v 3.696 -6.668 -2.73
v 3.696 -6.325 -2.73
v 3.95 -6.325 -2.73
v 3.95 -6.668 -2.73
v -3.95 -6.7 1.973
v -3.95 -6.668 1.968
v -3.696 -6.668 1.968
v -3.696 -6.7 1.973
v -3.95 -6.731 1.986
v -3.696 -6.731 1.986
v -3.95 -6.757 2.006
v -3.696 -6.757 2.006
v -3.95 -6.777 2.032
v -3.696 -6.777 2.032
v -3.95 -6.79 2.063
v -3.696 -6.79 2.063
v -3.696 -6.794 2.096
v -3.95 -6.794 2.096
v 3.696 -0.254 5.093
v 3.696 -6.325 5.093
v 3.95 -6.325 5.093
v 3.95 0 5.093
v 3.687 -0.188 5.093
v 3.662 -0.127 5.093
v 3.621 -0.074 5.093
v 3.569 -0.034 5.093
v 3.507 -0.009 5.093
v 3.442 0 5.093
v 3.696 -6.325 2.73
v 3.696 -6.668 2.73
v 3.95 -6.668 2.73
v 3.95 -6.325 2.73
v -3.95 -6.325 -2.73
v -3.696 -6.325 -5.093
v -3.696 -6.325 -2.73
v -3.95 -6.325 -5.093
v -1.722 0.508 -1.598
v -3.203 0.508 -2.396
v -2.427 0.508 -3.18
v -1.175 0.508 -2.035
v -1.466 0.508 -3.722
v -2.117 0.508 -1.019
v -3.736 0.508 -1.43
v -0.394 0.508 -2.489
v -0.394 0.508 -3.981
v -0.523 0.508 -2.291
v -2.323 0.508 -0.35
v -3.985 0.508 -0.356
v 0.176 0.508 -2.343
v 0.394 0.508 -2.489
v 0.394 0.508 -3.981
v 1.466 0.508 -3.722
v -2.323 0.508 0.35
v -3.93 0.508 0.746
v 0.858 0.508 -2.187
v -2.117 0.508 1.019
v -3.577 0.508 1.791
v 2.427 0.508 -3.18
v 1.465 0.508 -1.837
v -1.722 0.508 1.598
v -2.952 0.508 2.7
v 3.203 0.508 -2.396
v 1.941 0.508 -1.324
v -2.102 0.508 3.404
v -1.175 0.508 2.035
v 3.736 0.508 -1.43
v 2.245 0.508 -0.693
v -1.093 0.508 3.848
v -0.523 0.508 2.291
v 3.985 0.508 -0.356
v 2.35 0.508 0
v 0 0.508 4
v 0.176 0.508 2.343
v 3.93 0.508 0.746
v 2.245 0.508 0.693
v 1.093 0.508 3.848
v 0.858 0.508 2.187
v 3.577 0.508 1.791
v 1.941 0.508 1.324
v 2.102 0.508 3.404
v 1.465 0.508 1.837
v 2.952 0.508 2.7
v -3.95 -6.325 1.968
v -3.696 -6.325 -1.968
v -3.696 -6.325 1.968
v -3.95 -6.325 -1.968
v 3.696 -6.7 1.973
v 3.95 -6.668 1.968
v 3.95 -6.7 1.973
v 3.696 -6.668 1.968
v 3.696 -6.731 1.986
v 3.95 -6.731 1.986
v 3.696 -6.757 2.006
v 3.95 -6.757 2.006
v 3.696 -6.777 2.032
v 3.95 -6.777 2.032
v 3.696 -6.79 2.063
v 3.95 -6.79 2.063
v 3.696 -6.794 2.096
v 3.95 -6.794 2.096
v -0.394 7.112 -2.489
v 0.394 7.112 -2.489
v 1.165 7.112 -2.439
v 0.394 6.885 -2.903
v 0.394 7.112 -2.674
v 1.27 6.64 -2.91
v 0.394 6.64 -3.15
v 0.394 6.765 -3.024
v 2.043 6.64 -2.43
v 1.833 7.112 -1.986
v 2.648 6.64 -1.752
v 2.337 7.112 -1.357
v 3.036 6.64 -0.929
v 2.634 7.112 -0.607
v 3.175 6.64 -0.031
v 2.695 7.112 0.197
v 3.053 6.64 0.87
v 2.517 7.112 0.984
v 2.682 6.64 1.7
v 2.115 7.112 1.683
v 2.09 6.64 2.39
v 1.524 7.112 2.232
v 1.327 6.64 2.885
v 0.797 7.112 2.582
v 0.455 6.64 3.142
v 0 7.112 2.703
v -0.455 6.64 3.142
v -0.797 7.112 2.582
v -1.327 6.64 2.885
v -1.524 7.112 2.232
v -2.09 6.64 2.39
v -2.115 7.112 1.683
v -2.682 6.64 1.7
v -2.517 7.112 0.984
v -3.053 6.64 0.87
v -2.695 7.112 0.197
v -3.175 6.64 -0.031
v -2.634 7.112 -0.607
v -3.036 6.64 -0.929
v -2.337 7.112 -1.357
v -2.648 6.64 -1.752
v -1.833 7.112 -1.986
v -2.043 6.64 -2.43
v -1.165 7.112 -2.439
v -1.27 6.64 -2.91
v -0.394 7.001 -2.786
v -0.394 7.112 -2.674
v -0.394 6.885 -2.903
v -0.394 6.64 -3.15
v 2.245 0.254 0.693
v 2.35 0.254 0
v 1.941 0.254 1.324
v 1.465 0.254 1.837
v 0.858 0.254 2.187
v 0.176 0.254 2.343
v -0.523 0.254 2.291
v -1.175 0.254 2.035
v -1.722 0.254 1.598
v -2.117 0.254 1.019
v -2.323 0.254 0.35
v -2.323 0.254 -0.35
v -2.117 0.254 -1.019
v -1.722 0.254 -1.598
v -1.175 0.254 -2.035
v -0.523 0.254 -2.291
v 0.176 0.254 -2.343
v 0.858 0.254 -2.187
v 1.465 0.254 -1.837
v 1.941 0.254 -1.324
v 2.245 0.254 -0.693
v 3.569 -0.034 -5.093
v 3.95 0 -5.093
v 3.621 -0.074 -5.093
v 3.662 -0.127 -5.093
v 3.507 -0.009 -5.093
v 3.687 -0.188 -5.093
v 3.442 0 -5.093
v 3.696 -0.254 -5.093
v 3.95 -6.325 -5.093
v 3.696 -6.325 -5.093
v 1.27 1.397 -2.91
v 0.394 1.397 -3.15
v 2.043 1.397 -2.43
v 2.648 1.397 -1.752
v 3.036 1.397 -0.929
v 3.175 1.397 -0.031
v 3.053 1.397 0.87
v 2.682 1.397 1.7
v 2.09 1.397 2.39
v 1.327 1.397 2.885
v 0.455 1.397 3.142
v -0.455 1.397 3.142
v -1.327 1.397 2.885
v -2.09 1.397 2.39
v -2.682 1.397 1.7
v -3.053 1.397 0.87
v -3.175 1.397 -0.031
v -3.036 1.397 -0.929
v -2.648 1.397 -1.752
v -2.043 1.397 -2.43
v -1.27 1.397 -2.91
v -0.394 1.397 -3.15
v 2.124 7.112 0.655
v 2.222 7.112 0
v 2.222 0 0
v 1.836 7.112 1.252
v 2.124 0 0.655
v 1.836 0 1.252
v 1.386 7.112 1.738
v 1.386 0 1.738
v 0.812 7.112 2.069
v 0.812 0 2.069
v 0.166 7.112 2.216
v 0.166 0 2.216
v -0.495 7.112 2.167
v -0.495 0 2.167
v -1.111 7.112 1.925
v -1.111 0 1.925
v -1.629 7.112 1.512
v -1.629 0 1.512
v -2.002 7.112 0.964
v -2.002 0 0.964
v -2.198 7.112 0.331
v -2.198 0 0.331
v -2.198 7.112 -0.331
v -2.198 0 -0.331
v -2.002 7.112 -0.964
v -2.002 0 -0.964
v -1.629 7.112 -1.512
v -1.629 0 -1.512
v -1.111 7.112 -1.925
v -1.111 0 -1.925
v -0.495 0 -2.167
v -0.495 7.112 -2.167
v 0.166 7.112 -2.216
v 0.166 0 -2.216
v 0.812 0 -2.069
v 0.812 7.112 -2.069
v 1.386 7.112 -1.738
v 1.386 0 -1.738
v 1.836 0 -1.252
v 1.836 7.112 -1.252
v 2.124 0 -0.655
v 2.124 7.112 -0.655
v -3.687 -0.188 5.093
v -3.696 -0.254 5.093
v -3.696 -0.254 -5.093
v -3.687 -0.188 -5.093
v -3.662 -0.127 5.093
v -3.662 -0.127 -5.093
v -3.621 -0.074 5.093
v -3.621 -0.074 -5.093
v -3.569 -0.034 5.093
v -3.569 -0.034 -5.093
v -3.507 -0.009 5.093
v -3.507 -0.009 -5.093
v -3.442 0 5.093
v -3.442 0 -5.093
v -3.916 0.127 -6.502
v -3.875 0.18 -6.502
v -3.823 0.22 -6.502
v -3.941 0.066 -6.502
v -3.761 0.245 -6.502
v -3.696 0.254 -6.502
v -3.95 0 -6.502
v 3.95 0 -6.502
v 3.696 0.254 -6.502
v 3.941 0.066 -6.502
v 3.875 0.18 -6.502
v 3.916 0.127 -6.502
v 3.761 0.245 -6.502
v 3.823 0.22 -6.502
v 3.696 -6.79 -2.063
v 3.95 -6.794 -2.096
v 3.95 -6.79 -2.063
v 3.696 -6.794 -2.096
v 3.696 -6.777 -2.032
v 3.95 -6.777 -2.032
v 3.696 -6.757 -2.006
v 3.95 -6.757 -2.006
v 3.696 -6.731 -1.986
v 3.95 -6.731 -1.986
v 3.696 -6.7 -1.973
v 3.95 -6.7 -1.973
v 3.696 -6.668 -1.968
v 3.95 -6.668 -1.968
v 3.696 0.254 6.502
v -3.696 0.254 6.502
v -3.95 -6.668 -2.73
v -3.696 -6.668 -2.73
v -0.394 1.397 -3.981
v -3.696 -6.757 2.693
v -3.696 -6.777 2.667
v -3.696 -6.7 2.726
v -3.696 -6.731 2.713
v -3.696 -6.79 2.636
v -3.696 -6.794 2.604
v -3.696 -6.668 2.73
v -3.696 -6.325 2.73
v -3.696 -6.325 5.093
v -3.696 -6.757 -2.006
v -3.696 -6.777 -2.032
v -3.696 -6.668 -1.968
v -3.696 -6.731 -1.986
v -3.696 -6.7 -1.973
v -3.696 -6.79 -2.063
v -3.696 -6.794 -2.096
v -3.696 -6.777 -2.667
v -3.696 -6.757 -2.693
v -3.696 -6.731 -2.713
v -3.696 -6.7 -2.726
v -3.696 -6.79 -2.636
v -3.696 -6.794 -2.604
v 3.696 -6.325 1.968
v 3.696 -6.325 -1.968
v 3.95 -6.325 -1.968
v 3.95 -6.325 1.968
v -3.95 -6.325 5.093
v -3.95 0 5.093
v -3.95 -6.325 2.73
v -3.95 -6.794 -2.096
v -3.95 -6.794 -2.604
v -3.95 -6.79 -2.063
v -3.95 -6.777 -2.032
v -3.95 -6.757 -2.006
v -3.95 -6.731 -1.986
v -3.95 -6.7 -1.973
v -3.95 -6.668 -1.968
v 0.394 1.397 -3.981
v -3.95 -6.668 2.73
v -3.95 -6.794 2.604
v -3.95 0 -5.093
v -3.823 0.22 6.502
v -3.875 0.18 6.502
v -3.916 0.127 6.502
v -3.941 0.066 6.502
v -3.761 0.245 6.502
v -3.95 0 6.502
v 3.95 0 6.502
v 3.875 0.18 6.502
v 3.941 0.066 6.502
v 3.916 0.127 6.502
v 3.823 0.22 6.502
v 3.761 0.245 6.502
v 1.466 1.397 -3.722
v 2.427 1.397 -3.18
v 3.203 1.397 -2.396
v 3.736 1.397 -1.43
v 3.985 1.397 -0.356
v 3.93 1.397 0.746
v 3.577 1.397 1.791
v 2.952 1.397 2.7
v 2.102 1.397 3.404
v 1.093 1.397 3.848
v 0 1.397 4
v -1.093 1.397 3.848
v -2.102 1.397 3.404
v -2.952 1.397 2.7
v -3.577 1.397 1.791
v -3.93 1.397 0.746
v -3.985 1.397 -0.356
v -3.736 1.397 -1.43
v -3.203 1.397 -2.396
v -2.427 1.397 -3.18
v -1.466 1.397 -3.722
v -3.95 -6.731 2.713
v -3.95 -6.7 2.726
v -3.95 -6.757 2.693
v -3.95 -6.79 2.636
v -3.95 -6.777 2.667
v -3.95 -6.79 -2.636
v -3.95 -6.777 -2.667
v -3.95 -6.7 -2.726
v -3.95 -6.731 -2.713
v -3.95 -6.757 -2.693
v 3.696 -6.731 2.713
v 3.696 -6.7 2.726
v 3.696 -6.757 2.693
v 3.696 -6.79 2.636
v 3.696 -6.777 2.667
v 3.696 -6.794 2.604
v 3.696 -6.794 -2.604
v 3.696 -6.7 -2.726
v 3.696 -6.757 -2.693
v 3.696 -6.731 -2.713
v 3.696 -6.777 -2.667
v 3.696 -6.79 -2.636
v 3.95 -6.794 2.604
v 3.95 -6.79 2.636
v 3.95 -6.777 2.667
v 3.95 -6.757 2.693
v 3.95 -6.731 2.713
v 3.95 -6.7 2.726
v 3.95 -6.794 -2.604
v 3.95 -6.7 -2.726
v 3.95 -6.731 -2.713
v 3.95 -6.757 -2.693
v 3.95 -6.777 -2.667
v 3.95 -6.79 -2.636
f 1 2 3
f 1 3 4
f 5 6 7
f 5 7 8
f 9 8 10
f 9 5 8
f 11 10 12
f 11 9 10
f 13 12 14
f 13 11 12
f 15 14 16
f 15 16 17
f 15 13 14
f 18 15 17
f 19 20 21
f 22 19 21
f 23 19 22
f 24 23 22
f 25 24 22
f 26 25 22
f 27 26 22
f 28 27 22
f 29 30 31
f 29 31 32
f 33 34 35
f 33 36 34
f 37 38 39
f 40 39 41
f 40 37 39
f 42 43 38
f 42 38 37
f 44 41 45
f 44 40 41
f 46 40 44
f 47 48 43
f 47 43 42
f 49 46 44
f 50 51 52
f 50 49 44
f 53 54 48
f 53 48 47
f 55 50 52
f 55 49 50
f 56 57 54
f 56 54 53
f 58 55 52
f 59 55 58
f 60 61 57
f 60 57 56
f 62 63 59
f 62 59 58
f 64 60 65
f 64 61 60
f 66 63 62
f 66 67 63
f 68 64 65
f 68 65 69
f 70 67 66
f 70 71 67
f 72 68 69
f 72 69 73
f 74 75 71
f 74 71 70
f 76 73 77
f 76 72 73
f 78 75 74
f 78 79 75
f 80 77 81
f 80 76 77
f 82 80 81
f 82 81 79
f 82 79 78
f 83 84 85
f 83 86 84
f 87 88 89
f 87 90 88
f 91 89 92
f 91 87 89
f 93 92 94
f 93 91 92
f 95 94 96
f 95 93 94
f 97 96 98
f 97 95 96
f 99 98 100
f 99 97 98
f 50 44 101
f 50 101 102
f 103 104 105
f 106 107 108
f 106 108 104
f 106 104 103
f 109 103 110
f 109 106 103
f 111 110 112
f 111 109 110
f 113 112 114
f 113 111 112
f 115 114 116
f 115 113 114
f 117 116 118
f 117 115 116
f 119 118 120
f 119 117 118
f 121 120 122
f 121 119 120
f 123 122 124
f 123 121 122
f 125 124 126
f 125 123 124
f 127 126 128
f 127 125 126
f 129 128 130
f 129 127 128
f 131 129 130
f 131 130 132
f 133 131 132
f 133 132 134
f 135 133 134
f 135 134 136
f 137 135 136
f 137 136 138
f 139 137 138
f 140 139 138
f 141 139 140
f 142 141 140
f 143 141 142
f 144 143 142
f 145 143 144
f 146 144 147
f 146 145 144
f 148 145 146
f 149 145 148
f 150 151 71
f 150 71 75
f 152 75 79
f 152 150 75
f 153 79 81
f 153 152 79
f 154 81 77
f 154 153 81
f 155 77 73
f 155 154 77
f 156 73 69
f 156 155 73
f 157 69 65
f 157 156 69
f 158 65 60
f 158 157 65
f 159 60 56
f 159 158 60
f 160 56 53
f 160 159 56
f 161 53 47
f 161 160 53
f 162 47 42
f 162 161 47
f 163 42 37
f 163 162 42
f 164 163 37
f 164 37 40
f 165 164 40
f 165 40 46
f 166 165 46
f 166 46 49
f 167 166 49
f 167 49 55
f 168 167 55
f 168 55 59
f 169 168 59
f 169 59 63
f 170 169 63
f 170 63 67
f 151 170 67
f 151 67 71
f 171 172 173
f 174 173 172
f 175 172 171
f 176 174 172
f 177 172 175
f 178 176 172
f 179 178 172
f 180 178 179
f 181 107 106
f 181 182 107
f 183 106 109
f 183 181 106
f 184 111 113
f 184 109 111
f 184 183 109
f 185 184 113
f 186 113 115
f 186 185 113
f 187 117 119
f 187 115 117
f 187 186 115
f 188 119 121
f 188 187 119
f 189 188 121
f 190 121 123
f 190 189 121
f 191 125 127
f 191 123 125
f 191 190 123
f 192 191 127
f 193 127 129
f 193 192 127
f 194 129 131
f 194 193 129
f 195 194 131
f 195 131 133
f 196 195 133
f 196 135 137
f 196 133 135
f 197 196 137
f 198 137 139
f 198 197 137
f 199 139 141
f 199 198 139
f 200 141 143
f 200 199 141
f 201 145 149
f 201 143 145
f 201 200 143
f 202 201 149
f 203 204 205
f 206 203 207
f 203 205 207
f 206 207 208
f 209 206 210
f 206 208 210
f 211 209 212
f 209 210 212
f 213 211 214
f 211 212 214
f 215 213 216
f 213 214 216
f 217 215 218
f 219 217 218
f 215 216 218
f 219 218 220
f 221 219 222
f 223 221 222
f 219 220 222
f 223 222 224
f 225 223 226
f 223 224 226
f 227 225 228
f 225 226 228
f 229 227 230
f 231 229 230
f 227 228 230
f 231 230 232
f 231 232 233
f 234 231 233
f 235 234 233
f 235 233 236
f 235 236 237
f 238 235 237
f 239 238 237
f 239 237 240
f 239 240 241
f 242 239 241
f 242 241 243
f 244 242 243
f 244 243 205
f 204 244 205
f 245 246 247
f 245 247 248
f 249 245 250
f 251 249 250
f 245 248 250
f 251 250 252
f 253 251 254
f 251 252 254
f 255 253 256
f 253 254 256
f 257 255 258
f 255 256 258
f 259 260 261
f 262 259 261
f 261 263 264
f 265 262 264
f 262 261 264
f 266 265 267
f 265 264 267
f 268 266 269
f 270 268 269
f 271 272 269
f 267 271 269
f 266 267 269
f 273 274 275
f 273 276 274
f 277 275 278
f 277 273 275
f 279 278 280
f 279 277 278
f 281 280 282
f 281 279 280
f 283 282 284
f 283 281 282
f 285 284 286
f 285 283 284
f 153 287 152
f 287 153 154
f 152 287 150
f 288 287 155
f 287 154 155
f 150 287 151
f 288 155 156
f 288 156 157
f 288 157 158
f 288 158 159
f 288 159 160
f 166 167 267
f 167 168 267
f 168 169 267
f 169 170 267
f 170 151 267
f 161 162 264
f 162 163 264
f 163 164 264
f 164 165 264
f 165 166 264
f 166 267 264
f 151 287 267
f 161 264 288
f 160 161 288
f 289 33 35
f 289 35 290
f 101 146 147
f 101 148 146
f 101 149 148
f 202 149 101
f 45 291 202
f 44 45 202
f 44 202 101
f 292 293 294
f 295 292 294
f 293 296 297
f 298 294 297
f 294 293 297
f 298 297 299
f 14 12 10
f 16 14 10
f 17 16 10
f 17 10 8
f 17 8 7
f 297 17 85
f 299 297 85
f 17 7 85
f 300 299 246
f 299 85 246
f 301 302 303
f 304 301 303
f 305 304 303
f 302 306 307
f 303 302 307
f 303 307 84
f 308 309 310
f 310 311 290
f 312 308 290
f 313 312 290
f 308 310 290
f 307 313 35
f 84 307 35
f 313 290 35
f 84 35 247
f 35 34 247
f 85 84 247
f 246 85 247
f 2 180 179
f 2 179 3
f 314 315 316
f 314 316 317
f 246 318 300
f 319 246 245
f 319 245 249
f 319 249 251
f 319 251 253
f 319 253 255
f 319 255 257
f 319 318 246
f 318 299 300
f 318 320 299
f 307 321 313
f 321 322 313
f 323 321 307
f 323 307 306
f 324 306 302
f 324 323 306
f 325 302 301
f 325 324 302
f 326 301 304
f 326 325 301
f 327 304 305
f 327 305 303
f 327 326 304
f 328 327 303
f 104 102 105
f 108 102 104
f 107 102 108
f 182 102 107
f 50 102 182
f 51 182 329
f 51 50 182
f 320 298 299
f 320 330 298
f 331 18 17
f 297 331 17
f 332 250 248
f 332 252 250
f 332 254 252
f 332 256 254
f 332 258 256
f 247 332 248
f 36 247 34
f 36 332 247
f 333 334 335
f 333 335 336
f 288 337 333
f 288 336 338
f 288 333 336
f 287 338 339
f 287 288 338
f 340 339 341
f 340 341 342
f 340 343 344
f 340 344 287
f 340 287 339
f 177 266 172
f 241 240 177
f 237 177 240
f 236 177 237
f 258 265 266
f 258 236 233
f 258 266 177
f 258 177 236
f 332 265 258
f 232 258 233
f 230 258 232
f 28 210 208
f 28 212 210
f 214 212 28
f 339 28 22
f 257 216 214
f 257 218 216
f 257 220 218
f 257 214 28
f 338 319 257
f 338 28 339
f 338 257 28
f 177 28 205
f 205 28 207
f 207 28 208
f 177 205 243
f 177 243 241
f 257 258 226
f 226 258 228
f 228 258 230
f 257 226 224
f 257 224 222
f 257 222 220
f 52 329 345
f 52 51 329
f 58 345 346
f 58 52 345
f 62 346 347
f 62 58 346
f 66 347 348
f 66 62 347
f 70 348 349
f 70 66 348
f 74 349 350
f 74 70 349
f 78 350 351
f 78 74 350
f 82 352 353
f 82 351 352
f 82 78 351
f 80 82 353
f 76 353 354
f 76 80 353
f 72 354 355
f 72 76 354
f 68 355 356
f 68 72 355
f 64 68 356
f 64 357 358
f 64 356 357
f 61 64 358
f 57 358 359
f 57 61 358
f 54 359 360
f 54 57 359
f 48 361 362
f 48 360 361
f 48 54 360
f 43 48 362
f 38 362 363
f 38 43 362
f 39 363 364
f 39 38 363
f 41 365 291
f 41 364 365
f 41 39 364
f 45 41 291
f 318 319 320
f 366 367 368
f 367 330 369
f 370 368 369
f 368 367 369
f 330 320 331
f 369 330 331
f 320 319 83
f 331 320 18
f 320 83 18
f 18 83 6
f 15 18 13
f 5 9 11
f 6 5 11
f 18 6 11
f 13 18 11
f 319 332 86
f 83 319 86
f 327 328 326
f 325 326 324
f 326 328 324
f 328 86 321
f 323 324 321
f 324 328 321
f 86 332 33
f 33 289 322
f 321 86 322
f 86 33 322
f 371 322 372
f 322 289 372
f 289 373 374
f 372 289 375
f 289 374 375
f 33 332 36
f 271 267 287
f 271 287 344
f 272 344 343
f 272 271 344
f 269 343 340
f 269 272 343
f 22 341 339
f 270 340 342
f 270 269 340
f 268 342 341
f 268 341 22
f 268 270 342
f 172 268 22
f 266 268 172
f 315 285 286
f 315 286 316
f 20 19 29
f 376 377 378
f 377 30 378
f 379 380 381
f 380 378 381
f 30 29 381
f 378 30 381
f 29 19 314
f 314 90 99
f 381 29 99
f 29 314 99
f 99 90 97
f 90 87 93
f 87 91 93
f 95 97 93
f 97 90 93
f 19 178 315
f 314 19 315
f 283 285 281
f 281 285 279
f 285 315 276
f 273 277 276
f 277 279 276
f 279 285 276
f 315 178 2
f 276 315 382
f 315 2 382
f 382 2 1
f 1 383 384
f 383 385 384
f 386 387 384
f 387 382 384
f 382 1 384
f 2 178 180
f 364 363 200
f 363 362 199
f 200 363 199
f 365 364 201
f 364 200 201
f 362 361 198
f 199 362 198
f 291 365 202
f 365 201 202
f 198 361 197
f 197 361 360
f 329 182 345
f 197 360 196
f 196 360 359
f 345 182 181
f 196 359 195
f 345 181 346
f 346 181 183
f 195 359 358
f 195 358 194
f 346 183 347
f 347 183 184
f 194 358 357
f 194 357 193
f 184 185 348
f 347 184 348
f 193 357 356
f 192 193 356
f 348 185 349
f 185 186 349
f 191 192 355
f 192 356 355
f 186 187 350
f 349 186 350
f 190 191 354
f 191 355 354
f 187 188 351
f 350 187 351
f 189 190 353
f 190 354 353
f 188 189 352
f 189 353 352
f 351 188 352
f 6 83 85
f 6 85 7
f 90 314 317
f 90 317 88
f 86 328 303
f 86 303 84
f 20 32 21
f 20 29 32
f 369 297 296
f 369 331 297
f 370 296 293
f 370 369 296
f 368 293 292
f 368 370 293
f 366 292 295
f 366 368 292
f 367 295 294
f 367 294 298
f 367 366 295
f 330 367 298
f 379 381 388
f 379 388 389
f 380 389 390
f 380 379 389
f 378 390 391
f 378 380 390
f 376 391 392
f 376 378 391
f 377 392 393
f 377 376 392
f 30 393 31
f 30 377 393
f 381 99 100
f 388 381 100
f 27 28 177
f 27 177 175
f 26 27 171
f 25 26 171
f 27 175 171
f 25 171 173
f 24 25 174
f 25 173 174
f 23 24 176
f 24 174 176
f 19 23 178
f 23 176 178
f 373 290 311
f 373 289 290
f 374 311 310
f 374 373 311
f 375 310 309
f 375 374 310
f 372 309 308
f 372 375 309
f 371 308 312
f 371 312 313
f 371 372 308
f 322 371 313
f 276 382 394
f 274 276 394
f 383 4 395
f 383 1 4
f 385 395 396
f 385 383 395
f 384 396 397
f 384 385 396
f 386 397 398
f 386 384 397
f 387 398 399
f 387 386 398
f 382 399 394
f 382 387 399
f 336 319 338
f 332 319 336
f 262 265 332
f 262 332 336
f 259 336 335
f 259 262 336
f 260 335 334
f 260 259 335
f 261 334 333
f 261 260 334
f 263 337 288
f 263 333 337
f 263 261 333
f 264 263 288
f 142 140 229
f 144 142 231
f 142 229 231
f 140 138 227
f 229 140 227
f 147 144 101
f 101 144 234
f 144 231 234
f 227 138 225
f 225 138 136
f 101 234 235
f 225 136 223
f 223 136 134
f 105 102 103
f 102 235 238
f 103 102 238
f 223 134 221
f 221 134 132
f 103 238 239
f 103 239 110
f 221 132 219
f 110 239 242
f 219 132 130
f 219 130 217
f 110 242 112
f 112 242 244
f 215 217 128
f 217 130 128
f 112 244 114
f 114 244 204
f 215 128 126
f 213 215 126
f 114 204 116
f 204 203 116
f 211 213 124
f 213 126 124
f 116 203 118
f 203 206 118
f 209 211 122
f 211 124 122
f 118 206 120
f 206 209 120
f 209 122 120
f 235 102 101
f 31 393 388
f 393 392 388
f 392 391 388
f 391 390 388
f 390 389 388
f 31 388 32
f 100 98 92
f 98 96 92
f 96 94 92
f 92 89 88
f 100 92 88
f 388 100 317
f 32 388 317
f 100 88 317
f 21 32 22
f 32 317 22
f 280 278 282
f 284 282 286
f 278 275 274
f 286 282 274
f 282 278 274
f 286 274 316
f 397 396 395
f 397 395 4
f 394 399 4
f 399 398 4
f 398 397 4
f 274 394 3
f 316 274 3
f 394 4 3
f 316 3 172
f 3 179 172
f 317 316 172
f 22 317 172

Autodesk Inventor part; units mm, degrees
sketch "Sketch_1" plane through (0, 0, 0) normal (0, 0, 1) x (1, 0, 0)
  line L0 (-3.9497, 0) -> (-3.9497, -6.7945)
  line L1 (-3.9497, -6.7945) -> (-3.6957, -6.7945)
  line L2 (-3.6957, -6.7945) -> (-3.6957, -0.254)
  arc A0 (-3.4417, 0) -> (-3.6957, -0.254) centre (-3.4417, -0.254) ccw
  line L3 (-3.4417, 0) -> (3.4417, 0)
  arc A1 (3.6957, -0.254) -> (3.4417, 0) centre (3.4417, -0.254) ccw
  line L4 (3.6957, -0.254) -> (3.6957, -6.7945)
  line L5 (3.6957, -6.7945) -> (3.9497, -6.7945)
  line L6 (3.9497, -6.7945) -> (3.9497, 0)
  arc A2 (3.9497, 0) -> (3.6957, 0.254) centre (3.6957, 0) ccw
  line L7 (3.6957, 0.254) -> (-3.6957, 0.254)
  arc A3 (-3.6957, 0.254) -> (-3.9497, 0) centre (-3.6957, 0) ccw
extrude "Extrusion1" add sketch "Sketch_1" along normal mid plane 13.0048
sketch "Sketch_2" plane through (0, 0, 0) normal (1, 0, 0) x (0, 1, 0)
  line L0 (0, 7.8029) -> (-9.398, 7.8029)
  line L1 (-9.398, 7.8029) -> (-9.398, -7.8029)
  line L2 (-9.398, -7.8029) -> (0, -7.8029)
  line L3 (0, -7.8029) -> (0, -5.0927)
  line L4 (0, -5.0927) -> (-6.3246, -5.0927)
  line L5 (-6.3246, -5.0927) -> (-6.3246, -2.7305)
  line L6 (-6.3246, -2.7305) -> (-6.6675, -2.7305)
  arc A0 (-6.7945, -2.6035) -> (-6.6675, -2.7305) centre (-6.6675, -2.6035) ccw
  line L7 (-6.7945, -2.6035) -> (-6.7945, -2.0955)
  arc A1 (-6.6675, -1.9685) -> (-6.7945, -2.0955) centre (-6.6675, -2.0955) ccw
  line L8 (-6.6675, -1.9685) -> (-6.3246, -1.9685)
  line L9 (-6.3246, -1.9685) -> (-6.3246, 1.9685)
  line L10 (-6.3246, 1.9685) -> (-6.6675, 1.9685)
  arc A2 (-6.7945, 2.0955) -> (-6.6675, 1.9685) centre (-6.6675, 2.0955) ccw
  line L11 (-6.7945, 2.0955) -> (-6.7945, 2.6035)
  arc A3 (-6.6675, 2.7305) -> (-6.7945, 2.6035) centre (-6.6675, 2.6035) ccw
  line L12 (-6.6675, 2.7305) -> (-6.3246, 2.7305)
  line L13 (-6.3246, 2.7305) -> (-6.3246, 5.0927)
  line L14 (-6.3246, 5.0927) -> (0, 5.0927)
  line L15 (0, 5.0927) -> (0, 7.8029)
extrude "Extrusion2" cut sketch "Sketch_2" along normal mid plane 7.8994
sketch "Sketch_6" plane through (0, 0, 0) normal (0, 0, 1) x (1, 0, 0)
  line L0 (0, 0.127) -> (0, 7.112)
  line L1 (0, 7.112) -> (2.7026, 7.112)
  line L2 (2.7026, 7.112) -> (3.175, 6.6396)
  line L3 (3.175, 6.6396) -> (3.175, 1.397)
  line L4 (3.175, 1.397) -> (4.0005, 1.397)
  line L5 (4.0005, 1.397) -> (4.0005, 0.508)
  line L6 (4.0005, 0.508) -> (2.3495, 0.508)
  line L7 (2.3495, 0.508) -> (2.3495, 0.127)
  line L8 (2.3495, 0.127) -> (0, 0.127)
  line L9 (0, 0.127) -> (0, 7.112)
revolve "Revolution1" add sketch "Sketch_6" angle 360 about axis through (0, 0.127, 0) along (0, -1, 0)
thread "Thread1" size "1/4-32 UNEF" class "3A" standard "ANSI Unified Screw Threads" full length
sketch "Sketch_8" plane through (0, 0.254, 0) normal (0, 1, 0) x (1, 0, 0)
  line L0 (-0.3937, 2.4892) -> (0.3937, 2.4892)
  line L1 (0.3937, 2.4892) -> (0.3937, 10.4902)
  line L2 (0.3937, 10.4902) -> (-0.3937, 10.4902)
  line L3 (-0.3937, 10.4902) -> (-0.3937, 2.4892)
extrude "Extrusion3" cut sketch "Sketch_8" along normal blind 7.8232
sketch "Sketch_10_ALT_Drilling_1" plane through (0, 0, 0) normal (0, 0, 1) x (1, 0, 0)
  line L0 (0, 0) -> (0, 7.747)
  line L1 (0, 7.747) -> (2.2225, 7.747)
  line L2 (2.2225, 7.747) -> (2.2225, 0)
  line L3 (2.2225, 0) -> (0, 0)
  line L4 (0, 0) -> (0, 7.747)
revolve "Revolution2" cut sketch "Sketch_10_ALT_Drilling_1" angle 360 about axis through (0, 0, 0) along (0, -1, 0)
ref_plane "1_XY" through (0, 5.6896, 0) normal (0, 1, 0) x (1, 0, 0)
ref_plane "1_YZ" through (0, 5.6896, 0) normal (1, 0, 0) x (0, 0, -1)
ref_plane "1_ZX" through (0, 5.6896, 0) normal (0, 0, -1) x (0, 1, 0)
ref_plane "2_XY" through (0, 4.2672, 0) normal (0, 1, 0) x (1, 0, 0)
ref_plane "2_YZ" through (0, 4.2672, 0) normal (1, 0, 0) x (0, 0, -1)
ref_plane "2_ZX" through (0, 4.2672, 0) normal (0, 0, -1) x (0, 1, 0)
ref_plane "3_XY" through (0, 2.8448, 0) normal (0, 1, 0) x (1, 0, 0)
ref_plane "3_YZ" through (0, 2.8448, 0) normal (1, 0, 0) x (0, 0, -1)
ref_plane "3_ZX" through (0, 2.8448, 0) normal (0, 0, -1) x (0, 1, 0)
ref_plane "4_XY" through (0, 1.778, 0) normal (0, 1, 0) x (1, 0, 0)
ref_plane "4_YZ" through (0, 1.778, 0) normal (1, 0, 0) x (0, 0, -1)
ref_plane "4_ZX" through (0, 1.778, 0) normal (0, 0, -1) x (0, 1, 0)
ref_plane "to_base_XY" through (0, 0, 0) normal (0, 1, 0) x (1, 0, 0)
ref_plane "to_base_YZ" through (0, 0, 0) normal (1, 0, 0) x (0, 0, -1)
ref_plane "to_base_ZX" through (0, 0, 0) normal (0, 0, -1) x (0, 1, 0)
properties part number "M201A1M201BR-bushing"
